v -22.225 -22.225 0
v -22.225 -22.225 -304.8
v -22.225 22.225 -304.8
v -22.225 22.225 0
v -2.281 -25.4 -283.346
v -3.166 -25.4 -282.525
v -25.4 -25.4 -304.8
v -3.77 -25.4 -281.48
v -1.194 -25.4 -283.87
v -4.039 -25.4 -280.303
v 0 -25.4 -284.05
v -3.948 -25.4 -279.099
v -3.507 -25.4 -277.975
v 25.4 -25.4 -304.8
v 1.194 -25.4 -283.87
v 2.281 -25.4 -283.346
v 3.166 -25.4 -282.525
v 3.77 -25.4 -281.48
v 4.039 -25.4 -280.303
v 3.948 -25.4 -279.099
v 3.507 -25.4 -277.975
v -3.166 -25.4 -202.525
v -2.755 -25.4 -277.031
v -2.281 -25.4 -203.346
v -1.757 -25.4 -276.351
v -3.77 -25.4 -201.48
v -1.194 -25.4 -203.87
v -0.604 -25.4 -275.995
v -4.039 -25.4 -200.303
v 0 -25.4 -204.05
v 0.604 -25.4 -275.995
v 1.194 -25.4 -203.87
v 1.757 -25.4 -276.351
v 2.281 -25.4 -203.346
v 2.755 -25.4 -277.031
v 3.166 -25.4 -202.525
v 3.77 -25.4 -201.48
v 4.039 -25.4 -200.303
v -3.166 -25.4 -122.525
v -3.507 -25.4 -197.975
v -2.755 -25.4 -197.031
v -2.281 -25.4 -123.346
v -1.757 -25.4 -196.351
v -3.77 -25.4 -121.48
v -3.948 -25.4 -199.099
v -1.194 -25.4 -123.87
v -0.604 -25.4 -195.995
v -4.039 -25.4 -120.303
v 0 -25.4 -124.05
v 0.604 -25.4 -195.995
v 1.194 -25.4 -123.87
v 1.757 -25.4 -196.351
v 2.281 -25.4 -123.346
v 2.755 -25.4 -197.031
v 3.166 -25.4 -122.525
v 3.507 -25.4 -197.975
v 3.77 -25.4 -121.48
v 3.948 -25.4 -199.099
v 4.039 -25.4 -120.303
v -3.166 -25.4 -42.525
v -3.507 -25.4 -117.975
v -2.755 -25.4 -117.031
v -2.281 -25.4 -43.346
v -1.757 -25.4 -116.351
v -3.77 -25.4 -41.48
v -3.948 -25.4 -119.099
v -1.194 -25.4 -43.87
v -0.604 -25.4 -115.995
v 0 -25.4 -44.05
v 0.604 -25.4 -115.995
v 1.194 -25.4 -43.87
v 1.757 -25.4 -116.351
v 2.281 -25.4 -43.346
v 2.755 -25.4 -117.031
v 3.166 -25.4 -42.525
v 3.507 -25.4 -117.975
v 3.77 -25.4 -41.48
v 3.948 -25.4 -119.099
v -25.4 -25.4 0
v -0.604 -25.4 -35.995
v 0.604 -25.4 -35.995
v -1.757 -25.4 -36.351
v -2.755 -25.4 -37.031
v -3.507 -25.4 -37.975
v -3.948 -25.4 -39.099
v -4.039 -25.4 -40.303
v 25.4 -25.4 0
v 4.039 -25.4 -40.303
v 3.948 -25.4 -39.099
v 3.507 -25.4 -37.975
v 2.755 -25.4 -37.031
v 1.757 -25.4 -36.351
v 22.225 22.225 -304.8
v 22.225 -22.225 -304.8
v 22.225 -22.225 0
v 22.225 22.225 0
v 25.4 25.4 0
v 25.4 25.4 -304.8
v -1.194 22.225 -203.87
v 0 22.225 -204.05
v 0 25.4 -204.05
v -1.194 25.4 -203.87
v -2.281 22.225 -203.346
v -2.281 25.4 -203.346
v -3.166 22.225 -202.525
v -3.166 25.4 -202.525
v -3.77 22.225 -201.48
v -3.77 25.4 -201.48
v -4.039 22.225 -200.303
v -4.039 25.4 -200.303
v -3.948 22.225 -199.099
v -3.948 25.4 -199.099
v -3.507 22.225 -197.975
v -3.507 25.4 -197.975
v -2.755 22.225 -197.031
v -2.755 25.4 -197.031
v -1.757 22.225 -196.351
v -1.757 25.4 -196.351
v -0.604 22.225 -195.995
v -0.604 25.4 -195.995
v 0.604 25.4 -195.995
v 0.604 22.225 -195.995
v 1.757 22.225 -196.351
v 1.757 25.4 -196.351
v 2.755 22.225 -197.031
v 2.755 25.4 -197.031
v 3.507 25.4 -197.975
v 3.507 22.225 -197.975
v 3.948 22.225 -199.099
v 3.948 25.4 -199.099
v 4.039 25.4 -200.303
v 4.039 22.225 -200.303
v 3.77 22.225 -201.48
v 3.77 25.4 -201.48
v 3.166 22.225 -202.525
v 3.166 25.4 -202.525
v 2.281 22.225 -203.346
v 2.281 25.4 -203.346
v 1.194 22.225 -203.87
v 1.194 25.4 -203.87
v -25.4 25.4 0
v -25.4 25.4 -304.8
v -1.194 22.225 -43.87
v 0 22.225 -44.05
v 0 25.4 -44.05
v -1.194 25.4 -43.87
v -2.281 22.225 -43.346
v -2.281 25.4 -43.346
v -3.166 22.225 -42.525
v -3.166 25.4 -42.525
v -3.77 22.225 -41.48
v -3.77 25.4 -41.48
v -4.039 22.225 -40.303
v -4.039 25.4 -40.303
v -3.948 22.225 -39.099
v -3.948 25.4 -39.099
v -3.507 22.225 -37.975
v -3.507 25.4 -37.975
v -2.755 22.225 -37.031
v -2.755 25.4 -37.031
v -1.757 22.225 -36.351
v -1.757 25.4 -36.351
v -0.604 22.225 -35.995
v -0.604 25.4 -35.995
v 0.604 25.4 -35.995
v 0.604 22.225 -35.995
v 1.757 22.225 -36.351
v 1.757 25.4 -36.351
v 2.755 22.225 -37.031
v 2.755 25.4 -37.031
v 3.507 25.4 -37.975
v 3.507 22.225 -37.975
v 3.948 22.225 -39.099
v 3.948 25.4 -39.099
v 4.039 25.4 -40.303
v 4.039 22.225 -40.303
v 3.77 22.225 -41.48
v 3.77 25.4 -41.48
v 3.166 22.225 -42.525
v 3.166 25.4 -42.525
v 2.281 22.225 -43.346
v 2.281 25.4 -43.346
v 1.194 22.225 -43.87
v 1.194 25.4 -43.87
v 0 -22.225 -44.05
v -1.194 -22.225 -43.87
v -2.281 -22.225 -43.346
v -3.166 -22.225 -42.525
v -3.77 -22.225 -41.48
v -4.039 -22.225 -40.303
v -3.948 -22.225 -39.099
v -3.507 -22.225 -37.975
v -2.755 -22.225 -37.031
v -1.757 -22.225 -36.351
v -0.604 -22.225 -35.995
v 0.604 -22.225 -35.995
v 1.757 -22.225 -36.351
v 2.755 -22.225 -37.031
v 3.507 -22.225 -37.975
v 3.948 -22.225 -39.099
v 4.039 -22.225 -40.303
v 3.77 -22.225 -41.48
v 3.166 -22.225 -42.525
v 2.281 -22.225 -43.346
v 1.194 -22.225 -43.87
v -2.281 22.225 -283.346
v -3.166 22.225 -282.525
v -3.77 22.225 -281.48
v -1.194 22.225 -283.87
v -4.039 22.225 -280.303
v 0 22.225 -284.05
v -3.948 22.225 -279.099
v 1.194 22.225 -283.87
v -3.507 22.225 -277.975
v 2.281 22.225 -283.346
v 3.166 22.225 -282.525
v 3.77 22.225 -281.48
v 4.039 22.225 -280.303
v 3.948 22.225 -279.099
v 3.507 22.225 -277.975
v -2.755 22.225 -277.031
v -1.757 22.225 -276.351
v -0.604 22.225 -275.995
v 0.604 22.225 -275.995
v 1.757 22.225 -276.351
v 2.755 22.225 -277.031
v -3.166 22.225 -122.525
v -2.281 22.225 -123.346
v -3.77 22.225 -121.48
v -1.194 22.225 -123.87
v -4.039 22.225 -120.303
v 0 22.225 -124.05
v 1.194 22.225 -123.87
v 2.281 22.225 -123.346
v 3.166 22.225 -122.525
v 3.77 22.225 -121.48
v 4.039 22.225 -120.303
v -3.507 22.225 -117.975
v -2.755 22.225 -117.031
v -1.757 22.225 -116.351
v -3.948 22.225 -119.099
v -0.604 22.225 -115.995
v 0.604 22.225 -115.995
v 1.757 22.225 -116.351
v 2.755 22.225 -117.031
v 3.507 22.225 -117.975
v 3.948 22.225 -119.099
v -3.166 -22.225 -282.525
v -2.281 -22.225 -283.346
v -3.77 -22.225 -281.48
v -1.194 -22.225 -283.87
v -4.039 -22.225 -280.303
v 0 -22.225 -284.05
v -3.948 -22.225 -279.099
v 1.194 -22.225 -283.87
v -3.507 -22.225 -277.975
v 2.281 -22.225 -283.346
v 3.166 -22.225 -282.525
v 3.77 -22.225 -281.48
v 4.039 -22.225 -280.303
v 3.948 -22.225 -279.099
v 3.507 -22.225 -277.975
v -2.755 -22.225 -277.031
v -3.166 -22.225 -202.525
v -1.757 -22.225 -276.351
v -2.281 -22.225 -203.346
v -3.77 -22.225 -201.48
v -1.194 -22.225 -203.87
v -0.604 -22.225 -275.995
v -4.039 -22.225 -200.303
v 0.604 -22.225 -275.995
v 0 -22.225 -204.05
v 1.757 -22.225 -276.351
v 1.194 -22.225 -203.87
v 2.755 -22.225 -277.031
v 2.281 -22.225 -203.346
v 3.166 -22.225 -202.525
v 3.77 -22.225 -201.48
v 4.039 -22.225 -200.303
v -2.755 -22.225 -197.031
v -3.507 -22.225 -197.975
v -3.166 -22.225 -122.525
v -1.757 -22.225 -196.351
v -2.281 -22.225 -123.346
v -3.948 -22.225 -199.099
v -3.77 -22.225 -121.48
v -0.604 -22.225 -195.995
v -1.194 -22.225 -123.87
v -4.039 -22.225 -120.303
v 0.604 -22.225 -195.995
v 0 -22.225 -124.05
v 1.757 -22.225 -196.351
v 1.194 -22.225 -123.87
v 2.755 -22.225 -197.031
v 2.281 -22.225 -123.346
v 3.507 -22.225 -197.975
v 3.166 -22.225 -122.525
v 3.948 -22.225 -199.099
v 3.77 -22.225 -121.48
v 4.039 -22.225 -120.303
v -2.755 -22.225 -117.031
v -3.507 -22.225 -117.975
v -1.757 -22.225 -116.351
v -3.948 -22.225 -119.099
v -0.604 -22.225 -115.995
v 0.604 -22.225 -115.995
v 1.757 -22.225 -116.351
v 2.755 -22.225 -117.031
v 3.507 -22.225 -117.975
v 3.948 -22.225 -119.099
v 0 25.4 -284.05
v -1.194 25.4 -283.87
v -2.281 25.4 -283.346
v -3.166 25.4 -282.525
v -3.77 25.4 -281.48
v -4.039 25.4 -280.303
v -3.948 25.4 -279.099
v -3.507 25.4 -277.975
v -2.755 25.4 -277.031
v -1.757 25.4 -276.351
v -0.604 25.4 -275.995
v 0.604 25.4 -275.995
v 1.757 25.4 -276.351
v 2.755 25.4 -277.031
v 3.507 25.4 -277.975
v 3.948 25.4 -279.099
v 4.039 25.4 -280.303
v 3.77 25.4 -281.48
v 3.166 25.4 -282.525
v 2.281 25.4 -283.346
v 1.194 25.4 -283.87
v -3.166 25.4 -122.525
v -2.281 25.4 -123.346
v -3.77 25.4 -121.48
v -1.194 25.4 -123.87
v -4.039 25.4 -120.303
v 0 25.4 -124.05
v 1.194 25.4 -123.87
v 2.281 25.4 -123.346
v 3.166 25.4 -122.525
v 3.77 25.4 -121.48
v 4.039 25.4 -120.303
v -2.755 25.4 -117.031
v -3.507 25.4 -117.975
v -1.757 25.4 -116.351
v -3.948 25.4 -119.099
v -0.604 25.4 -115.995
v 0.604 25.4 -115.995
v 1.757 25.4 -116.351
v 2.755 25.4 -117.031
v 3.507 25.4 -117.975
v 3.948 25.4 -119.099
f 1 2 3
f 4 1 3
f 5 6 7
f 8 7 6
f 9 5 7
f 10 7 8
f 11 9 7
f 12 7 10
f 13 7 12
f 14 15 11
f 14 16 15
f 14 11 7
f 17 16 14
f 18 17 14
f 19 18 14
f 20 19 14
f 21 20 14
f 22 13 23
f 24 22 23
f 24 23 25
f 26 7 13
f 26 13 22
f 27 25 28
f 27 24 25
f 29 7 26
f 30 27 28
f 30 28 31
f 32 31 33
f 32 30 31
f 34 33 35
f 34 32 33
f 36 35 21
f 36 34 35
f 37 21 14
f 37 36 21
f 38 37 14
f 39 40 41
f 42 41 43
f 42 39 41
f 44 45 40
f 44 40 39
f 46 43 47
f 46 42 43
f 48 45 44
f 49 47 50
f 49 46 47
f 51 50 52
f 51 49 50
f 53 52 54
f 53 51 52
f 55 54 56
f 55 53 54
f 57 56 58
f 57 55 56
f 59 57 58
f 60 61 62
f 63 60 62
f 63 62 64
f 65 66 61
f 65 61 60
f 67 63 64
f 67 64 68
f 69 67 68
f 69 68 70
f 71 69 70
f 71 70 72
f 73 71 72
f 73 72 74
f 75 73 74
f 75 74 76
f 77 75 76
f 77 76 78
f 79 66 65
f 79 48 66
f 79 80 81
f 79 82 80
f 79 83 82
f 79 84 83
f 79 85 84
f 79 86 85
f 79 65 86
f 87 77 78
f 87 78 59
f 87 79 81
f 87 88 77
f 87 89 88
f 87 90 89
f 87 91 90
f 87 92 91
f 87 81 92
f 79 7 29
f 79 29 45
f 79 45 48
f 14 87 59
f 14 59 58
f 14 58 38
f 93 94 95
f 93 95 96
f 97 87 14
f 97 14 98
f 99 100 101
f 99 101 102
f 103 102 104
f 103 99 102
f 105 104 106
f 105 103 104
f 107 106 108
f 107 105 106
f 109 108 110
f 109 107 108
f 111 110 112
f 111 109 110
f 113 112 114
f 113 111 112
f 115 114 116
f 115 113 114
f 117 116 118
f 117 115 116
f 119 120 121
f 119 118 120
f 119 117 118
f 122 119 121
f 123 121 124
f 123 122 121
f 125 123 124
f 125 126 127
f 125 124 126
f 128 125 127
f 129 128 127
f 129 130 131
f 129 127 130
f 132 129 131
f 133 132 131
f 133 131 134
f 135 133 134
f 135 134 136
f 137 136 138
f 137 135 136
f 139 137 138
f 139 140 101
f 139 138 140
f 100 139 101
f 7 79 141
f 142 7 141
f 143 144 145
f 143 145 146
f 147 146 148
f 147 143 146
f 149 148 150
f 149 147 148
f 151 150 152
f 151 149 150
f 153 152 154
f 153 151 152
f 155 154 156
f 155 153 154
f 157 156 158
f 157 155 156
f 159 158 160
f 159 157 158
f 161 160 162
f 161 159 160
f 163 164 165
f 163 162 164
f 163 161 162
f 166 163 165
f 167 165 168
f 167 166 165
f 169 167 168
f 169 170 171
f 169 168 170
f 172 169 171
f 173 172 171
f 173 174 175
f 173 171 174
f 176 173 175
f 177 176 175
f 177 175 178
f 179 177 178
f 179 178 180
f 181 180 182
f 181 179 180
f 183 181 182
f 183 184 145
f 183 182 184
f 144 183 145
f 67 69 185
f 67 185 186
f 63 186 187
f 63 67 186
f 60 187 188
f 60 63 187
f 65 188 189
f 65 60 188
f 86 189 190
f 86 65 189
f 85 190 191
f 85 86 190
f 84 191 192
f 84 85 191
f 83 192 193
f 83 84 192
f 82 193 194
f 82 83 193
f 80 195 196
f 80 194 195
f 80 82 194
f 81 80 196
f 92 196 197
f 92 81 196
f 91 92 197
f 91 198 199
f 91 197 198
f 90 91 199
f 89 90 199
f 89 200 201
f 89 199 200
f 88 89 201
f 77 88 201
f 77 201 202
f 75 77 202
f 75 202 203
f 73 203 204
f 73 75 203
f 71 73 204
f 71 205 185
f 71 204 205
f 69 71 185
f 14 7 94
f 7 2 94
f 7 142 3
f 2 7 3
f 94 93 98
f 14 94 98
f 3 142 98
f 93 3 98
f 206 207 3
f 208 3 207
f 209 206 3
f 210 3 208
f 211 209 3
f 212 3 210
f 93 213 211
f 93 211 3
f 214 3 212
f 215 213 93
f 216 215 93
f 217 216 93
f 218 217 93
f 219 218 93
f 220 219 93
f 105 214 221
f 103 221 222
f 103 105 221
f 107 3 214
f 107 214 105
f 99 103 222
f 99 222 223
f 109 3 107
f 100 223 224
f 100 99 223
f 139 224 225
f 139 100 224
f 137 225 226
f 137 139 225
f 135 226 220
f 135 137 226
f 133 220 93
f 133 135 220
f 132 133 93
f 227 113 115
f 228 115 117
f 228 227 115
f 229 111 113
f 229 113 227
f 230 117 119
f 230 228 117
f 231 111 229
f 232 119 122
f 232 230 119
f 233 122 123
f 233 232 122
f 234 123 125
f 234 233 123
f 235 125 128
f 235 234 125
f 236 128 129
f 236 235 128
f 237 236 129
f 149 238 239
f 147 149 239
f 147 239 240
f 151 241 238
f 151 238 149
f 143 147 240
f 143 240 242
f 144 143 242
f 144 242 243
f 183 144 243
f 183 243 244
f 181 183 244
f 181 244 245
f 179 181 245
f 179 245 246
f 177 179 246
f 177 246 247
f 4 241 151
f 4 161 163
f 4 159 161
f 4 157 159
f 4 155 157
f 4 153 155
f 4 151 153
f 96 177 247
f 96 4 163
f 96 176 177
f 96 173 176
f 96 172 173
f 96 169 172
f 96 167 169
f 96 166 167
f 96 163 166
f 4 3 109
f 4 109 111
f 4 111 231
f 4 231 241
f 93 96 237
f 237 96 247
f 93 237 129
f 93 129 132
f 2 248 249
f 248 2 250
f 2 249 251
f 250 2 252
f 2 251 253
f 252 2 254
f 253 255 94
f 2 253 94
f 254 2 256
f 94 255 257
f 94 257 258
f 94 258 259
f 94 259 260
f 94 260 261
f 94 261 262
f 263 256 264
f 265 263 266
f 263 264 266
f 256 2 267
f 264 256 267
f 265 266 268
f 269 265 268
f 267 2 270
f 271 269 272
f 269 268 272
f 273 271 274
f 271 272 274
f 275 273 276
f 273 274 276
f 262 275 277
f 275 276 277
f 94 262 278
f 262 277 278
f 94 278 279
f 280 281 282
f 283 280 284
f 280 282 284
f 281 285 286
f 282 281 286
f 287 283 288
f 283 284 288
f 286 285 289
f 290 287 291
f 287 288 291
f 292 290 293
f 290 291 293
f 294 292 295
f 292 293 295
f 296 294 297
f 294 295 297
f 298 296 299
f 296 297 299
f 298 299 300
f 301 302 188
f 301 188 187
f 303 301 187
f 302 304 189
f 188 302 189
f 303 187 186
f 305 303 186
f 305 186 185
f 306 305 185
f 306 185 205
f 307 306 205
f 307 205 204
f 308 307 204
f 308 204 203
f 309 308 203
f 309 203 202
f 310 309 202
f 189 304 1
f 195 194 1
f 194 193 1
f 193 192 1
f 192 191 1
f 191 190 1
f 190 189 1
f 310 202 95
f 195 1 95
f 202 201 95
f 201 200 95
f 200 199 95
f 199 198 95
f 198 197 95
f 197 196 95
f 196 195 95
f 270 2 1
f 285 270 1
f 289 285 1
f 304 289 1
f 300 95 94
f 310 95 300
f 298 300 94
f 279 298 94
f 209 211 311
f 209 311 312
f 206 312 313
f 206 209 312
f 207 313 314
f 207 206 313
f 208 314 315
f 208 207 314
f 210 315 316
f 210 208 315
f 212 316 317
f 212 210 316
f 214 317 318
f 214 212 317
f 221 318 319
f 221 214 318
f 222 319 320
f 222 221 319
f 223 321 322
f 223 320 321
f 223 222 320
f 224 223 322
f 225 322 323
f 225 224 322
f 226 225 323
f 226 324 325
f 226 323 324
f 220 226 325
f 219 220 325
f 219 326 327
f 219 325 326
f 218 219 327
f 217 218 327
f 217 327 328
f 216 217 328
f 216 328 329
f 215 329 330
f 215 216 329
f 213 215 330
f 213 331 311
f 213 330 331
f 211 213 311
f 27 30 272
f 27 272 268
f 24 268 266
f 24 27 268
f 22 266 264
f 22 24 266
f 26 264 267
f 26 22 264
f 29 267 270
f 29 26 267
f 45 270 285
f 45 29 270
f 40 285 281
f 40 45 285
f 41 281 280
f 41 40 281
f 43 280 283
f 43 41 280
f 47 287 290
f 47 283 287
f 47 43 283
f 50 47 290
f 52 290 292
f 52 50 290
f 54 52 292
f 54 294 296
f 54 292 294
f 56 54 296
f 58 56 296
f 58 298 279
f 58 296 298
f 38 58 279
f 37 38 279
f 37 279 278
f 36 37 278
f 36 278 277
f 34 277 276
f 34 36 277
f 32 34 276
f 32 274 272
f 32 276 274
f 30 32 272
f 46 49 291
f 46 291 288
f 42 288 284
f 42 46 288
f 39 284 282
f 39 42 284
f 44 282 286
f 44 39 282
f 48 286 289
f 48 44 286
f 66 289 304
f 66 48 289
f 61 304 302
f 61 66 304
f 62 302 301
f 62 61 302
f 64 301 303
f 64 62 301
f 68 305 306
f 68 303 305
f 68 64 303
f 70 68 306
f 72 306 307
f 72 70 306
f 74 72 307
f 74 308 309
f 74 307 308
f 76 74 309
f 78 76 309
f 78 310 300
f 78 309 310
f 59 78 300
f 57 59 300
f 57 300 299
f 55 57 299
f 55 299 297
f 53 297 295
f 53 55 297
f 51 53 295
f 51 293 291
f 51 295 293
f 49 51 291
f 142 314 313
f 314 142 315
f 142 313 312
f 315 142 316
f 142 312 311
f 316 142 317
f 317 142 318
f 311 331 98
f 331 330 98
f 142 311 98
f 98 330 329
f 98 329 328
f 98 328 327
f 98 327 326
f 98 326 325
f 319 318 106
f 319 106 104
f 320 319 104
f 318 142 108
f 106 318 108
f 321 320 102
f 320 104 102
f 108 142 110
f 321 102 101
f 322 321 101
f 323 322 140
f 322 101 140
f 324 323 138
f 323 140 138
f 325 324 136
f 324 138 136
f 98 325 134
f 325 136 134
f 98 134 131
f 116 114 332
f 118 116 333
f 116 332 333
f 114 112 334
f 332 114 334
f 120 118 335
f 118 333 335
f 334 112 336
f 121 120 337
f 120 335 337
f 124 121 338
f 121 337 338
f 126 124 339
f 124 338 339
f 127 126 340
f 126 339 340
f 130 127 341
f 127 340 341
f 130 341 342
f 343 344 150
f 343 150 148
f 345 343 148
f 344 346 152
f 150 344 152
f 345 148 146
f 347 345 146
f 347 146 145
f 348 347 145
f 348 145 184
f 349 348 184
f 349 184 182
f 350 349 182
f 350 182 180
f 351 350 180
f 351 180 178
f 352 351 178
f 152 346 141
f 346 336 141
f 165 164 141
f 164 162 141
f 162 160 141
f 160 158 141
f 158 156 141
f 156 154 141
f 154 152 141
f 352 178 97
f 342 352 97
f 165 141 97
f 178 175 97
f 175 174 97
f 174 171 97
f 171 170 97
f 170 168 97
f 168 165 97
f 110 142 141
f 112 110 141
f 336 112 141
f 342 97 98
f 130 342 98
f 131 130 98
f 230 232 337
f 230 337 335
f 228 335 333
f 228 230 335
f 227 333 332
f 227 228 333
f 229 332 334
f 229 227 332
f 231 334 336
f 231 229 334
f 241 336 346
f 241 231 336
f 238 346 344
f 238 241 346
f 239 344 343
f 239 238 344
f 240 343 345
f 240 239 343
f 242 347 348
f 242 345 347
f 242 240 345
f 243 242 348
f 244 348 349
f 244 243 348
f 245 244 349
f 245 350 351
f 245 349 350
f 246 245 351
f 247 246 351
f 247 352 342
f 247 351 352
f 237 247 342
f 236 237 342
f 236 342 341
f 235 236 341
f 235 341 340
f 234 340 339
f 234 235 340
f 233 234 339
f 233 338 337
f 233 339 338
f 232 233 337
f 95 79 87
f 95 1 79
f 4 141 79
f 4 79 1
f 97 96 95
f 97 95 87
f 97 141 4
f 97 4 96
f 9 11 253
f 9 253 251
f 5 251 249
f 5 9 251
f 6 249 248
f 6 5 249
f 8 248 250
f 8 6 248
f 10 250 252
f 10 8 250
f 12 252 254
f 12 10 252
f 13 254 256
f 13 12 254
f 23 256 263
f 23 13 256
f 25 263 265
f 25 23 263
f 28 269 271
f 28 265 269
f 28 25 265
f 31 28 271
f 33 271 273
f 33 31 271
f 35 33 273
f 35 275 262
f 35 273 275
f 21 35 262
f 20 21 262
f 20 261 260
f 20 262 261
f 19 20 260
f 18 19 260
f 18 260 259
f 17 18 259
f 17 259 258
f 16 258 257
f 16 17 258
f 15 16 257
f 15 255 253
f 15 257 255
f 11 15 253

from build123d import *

# Parameters (mm, degrees)
SKETCH1_W               = 50.8
SKETCH1_H               = 50.8
SKETCH1_W_2             = 44.45
SKETCH1_H_2             = 44.45
BOSS_EXTRUDE1_DEPTH     = 304.8
CUT_EXTRUDE1_DEPTH      = 304.8
CUT_EXTRUDE1_DEPTH_BACK = 304.8
SKETCH2_R               = 4.05


with BuildPart() as part:
    # Sketch1 → Boss-Extrude1 (new body)
    with BuildSketch(Plane.XY):
        Rectangle(SKETCH1_W, SKETCH1_H)
        Rectangle(SKETCH1_W_2, SKETCH1_H_2, mode=Mode.SUBTRACT)
    extrude(amount=-BOSS_EXTRUDE1_DEPTH)

    # Sketch2 → Cut-Extrude1 (cut, two sides: drawn at the far end of the back side and taken through both)
    with BuildSketch(Plane(origin=(0, 0, 0), x_dir=(1, 0, 0), z_dir=(0, 1, 0)).offset(-CUT_EXTRUDE1_DEPTH_BACK)):
        with Locations(Location((0, 40, 0), (0, 0, 90))):
            Circle(SKETCH2_R)
        with Locations(Location((0, 120, 0), (0, 0, 90))):
            Circle(SKETCH2_R)
        with Locations(Location((0, 200, 0), (0, 0, 90))):
            Circle(SKETCH2_R)
        with Locations(Location((0, 280, 0), (0, 0, 90))):
            Circle(SKETCH2_R)
    extrude(amount=CUT_EXTRUDE1_DEPTH + CUT_EXTRUDE1_DEPTH_BACK, mode=Mode.SUBTRACT)


solid = part.part
